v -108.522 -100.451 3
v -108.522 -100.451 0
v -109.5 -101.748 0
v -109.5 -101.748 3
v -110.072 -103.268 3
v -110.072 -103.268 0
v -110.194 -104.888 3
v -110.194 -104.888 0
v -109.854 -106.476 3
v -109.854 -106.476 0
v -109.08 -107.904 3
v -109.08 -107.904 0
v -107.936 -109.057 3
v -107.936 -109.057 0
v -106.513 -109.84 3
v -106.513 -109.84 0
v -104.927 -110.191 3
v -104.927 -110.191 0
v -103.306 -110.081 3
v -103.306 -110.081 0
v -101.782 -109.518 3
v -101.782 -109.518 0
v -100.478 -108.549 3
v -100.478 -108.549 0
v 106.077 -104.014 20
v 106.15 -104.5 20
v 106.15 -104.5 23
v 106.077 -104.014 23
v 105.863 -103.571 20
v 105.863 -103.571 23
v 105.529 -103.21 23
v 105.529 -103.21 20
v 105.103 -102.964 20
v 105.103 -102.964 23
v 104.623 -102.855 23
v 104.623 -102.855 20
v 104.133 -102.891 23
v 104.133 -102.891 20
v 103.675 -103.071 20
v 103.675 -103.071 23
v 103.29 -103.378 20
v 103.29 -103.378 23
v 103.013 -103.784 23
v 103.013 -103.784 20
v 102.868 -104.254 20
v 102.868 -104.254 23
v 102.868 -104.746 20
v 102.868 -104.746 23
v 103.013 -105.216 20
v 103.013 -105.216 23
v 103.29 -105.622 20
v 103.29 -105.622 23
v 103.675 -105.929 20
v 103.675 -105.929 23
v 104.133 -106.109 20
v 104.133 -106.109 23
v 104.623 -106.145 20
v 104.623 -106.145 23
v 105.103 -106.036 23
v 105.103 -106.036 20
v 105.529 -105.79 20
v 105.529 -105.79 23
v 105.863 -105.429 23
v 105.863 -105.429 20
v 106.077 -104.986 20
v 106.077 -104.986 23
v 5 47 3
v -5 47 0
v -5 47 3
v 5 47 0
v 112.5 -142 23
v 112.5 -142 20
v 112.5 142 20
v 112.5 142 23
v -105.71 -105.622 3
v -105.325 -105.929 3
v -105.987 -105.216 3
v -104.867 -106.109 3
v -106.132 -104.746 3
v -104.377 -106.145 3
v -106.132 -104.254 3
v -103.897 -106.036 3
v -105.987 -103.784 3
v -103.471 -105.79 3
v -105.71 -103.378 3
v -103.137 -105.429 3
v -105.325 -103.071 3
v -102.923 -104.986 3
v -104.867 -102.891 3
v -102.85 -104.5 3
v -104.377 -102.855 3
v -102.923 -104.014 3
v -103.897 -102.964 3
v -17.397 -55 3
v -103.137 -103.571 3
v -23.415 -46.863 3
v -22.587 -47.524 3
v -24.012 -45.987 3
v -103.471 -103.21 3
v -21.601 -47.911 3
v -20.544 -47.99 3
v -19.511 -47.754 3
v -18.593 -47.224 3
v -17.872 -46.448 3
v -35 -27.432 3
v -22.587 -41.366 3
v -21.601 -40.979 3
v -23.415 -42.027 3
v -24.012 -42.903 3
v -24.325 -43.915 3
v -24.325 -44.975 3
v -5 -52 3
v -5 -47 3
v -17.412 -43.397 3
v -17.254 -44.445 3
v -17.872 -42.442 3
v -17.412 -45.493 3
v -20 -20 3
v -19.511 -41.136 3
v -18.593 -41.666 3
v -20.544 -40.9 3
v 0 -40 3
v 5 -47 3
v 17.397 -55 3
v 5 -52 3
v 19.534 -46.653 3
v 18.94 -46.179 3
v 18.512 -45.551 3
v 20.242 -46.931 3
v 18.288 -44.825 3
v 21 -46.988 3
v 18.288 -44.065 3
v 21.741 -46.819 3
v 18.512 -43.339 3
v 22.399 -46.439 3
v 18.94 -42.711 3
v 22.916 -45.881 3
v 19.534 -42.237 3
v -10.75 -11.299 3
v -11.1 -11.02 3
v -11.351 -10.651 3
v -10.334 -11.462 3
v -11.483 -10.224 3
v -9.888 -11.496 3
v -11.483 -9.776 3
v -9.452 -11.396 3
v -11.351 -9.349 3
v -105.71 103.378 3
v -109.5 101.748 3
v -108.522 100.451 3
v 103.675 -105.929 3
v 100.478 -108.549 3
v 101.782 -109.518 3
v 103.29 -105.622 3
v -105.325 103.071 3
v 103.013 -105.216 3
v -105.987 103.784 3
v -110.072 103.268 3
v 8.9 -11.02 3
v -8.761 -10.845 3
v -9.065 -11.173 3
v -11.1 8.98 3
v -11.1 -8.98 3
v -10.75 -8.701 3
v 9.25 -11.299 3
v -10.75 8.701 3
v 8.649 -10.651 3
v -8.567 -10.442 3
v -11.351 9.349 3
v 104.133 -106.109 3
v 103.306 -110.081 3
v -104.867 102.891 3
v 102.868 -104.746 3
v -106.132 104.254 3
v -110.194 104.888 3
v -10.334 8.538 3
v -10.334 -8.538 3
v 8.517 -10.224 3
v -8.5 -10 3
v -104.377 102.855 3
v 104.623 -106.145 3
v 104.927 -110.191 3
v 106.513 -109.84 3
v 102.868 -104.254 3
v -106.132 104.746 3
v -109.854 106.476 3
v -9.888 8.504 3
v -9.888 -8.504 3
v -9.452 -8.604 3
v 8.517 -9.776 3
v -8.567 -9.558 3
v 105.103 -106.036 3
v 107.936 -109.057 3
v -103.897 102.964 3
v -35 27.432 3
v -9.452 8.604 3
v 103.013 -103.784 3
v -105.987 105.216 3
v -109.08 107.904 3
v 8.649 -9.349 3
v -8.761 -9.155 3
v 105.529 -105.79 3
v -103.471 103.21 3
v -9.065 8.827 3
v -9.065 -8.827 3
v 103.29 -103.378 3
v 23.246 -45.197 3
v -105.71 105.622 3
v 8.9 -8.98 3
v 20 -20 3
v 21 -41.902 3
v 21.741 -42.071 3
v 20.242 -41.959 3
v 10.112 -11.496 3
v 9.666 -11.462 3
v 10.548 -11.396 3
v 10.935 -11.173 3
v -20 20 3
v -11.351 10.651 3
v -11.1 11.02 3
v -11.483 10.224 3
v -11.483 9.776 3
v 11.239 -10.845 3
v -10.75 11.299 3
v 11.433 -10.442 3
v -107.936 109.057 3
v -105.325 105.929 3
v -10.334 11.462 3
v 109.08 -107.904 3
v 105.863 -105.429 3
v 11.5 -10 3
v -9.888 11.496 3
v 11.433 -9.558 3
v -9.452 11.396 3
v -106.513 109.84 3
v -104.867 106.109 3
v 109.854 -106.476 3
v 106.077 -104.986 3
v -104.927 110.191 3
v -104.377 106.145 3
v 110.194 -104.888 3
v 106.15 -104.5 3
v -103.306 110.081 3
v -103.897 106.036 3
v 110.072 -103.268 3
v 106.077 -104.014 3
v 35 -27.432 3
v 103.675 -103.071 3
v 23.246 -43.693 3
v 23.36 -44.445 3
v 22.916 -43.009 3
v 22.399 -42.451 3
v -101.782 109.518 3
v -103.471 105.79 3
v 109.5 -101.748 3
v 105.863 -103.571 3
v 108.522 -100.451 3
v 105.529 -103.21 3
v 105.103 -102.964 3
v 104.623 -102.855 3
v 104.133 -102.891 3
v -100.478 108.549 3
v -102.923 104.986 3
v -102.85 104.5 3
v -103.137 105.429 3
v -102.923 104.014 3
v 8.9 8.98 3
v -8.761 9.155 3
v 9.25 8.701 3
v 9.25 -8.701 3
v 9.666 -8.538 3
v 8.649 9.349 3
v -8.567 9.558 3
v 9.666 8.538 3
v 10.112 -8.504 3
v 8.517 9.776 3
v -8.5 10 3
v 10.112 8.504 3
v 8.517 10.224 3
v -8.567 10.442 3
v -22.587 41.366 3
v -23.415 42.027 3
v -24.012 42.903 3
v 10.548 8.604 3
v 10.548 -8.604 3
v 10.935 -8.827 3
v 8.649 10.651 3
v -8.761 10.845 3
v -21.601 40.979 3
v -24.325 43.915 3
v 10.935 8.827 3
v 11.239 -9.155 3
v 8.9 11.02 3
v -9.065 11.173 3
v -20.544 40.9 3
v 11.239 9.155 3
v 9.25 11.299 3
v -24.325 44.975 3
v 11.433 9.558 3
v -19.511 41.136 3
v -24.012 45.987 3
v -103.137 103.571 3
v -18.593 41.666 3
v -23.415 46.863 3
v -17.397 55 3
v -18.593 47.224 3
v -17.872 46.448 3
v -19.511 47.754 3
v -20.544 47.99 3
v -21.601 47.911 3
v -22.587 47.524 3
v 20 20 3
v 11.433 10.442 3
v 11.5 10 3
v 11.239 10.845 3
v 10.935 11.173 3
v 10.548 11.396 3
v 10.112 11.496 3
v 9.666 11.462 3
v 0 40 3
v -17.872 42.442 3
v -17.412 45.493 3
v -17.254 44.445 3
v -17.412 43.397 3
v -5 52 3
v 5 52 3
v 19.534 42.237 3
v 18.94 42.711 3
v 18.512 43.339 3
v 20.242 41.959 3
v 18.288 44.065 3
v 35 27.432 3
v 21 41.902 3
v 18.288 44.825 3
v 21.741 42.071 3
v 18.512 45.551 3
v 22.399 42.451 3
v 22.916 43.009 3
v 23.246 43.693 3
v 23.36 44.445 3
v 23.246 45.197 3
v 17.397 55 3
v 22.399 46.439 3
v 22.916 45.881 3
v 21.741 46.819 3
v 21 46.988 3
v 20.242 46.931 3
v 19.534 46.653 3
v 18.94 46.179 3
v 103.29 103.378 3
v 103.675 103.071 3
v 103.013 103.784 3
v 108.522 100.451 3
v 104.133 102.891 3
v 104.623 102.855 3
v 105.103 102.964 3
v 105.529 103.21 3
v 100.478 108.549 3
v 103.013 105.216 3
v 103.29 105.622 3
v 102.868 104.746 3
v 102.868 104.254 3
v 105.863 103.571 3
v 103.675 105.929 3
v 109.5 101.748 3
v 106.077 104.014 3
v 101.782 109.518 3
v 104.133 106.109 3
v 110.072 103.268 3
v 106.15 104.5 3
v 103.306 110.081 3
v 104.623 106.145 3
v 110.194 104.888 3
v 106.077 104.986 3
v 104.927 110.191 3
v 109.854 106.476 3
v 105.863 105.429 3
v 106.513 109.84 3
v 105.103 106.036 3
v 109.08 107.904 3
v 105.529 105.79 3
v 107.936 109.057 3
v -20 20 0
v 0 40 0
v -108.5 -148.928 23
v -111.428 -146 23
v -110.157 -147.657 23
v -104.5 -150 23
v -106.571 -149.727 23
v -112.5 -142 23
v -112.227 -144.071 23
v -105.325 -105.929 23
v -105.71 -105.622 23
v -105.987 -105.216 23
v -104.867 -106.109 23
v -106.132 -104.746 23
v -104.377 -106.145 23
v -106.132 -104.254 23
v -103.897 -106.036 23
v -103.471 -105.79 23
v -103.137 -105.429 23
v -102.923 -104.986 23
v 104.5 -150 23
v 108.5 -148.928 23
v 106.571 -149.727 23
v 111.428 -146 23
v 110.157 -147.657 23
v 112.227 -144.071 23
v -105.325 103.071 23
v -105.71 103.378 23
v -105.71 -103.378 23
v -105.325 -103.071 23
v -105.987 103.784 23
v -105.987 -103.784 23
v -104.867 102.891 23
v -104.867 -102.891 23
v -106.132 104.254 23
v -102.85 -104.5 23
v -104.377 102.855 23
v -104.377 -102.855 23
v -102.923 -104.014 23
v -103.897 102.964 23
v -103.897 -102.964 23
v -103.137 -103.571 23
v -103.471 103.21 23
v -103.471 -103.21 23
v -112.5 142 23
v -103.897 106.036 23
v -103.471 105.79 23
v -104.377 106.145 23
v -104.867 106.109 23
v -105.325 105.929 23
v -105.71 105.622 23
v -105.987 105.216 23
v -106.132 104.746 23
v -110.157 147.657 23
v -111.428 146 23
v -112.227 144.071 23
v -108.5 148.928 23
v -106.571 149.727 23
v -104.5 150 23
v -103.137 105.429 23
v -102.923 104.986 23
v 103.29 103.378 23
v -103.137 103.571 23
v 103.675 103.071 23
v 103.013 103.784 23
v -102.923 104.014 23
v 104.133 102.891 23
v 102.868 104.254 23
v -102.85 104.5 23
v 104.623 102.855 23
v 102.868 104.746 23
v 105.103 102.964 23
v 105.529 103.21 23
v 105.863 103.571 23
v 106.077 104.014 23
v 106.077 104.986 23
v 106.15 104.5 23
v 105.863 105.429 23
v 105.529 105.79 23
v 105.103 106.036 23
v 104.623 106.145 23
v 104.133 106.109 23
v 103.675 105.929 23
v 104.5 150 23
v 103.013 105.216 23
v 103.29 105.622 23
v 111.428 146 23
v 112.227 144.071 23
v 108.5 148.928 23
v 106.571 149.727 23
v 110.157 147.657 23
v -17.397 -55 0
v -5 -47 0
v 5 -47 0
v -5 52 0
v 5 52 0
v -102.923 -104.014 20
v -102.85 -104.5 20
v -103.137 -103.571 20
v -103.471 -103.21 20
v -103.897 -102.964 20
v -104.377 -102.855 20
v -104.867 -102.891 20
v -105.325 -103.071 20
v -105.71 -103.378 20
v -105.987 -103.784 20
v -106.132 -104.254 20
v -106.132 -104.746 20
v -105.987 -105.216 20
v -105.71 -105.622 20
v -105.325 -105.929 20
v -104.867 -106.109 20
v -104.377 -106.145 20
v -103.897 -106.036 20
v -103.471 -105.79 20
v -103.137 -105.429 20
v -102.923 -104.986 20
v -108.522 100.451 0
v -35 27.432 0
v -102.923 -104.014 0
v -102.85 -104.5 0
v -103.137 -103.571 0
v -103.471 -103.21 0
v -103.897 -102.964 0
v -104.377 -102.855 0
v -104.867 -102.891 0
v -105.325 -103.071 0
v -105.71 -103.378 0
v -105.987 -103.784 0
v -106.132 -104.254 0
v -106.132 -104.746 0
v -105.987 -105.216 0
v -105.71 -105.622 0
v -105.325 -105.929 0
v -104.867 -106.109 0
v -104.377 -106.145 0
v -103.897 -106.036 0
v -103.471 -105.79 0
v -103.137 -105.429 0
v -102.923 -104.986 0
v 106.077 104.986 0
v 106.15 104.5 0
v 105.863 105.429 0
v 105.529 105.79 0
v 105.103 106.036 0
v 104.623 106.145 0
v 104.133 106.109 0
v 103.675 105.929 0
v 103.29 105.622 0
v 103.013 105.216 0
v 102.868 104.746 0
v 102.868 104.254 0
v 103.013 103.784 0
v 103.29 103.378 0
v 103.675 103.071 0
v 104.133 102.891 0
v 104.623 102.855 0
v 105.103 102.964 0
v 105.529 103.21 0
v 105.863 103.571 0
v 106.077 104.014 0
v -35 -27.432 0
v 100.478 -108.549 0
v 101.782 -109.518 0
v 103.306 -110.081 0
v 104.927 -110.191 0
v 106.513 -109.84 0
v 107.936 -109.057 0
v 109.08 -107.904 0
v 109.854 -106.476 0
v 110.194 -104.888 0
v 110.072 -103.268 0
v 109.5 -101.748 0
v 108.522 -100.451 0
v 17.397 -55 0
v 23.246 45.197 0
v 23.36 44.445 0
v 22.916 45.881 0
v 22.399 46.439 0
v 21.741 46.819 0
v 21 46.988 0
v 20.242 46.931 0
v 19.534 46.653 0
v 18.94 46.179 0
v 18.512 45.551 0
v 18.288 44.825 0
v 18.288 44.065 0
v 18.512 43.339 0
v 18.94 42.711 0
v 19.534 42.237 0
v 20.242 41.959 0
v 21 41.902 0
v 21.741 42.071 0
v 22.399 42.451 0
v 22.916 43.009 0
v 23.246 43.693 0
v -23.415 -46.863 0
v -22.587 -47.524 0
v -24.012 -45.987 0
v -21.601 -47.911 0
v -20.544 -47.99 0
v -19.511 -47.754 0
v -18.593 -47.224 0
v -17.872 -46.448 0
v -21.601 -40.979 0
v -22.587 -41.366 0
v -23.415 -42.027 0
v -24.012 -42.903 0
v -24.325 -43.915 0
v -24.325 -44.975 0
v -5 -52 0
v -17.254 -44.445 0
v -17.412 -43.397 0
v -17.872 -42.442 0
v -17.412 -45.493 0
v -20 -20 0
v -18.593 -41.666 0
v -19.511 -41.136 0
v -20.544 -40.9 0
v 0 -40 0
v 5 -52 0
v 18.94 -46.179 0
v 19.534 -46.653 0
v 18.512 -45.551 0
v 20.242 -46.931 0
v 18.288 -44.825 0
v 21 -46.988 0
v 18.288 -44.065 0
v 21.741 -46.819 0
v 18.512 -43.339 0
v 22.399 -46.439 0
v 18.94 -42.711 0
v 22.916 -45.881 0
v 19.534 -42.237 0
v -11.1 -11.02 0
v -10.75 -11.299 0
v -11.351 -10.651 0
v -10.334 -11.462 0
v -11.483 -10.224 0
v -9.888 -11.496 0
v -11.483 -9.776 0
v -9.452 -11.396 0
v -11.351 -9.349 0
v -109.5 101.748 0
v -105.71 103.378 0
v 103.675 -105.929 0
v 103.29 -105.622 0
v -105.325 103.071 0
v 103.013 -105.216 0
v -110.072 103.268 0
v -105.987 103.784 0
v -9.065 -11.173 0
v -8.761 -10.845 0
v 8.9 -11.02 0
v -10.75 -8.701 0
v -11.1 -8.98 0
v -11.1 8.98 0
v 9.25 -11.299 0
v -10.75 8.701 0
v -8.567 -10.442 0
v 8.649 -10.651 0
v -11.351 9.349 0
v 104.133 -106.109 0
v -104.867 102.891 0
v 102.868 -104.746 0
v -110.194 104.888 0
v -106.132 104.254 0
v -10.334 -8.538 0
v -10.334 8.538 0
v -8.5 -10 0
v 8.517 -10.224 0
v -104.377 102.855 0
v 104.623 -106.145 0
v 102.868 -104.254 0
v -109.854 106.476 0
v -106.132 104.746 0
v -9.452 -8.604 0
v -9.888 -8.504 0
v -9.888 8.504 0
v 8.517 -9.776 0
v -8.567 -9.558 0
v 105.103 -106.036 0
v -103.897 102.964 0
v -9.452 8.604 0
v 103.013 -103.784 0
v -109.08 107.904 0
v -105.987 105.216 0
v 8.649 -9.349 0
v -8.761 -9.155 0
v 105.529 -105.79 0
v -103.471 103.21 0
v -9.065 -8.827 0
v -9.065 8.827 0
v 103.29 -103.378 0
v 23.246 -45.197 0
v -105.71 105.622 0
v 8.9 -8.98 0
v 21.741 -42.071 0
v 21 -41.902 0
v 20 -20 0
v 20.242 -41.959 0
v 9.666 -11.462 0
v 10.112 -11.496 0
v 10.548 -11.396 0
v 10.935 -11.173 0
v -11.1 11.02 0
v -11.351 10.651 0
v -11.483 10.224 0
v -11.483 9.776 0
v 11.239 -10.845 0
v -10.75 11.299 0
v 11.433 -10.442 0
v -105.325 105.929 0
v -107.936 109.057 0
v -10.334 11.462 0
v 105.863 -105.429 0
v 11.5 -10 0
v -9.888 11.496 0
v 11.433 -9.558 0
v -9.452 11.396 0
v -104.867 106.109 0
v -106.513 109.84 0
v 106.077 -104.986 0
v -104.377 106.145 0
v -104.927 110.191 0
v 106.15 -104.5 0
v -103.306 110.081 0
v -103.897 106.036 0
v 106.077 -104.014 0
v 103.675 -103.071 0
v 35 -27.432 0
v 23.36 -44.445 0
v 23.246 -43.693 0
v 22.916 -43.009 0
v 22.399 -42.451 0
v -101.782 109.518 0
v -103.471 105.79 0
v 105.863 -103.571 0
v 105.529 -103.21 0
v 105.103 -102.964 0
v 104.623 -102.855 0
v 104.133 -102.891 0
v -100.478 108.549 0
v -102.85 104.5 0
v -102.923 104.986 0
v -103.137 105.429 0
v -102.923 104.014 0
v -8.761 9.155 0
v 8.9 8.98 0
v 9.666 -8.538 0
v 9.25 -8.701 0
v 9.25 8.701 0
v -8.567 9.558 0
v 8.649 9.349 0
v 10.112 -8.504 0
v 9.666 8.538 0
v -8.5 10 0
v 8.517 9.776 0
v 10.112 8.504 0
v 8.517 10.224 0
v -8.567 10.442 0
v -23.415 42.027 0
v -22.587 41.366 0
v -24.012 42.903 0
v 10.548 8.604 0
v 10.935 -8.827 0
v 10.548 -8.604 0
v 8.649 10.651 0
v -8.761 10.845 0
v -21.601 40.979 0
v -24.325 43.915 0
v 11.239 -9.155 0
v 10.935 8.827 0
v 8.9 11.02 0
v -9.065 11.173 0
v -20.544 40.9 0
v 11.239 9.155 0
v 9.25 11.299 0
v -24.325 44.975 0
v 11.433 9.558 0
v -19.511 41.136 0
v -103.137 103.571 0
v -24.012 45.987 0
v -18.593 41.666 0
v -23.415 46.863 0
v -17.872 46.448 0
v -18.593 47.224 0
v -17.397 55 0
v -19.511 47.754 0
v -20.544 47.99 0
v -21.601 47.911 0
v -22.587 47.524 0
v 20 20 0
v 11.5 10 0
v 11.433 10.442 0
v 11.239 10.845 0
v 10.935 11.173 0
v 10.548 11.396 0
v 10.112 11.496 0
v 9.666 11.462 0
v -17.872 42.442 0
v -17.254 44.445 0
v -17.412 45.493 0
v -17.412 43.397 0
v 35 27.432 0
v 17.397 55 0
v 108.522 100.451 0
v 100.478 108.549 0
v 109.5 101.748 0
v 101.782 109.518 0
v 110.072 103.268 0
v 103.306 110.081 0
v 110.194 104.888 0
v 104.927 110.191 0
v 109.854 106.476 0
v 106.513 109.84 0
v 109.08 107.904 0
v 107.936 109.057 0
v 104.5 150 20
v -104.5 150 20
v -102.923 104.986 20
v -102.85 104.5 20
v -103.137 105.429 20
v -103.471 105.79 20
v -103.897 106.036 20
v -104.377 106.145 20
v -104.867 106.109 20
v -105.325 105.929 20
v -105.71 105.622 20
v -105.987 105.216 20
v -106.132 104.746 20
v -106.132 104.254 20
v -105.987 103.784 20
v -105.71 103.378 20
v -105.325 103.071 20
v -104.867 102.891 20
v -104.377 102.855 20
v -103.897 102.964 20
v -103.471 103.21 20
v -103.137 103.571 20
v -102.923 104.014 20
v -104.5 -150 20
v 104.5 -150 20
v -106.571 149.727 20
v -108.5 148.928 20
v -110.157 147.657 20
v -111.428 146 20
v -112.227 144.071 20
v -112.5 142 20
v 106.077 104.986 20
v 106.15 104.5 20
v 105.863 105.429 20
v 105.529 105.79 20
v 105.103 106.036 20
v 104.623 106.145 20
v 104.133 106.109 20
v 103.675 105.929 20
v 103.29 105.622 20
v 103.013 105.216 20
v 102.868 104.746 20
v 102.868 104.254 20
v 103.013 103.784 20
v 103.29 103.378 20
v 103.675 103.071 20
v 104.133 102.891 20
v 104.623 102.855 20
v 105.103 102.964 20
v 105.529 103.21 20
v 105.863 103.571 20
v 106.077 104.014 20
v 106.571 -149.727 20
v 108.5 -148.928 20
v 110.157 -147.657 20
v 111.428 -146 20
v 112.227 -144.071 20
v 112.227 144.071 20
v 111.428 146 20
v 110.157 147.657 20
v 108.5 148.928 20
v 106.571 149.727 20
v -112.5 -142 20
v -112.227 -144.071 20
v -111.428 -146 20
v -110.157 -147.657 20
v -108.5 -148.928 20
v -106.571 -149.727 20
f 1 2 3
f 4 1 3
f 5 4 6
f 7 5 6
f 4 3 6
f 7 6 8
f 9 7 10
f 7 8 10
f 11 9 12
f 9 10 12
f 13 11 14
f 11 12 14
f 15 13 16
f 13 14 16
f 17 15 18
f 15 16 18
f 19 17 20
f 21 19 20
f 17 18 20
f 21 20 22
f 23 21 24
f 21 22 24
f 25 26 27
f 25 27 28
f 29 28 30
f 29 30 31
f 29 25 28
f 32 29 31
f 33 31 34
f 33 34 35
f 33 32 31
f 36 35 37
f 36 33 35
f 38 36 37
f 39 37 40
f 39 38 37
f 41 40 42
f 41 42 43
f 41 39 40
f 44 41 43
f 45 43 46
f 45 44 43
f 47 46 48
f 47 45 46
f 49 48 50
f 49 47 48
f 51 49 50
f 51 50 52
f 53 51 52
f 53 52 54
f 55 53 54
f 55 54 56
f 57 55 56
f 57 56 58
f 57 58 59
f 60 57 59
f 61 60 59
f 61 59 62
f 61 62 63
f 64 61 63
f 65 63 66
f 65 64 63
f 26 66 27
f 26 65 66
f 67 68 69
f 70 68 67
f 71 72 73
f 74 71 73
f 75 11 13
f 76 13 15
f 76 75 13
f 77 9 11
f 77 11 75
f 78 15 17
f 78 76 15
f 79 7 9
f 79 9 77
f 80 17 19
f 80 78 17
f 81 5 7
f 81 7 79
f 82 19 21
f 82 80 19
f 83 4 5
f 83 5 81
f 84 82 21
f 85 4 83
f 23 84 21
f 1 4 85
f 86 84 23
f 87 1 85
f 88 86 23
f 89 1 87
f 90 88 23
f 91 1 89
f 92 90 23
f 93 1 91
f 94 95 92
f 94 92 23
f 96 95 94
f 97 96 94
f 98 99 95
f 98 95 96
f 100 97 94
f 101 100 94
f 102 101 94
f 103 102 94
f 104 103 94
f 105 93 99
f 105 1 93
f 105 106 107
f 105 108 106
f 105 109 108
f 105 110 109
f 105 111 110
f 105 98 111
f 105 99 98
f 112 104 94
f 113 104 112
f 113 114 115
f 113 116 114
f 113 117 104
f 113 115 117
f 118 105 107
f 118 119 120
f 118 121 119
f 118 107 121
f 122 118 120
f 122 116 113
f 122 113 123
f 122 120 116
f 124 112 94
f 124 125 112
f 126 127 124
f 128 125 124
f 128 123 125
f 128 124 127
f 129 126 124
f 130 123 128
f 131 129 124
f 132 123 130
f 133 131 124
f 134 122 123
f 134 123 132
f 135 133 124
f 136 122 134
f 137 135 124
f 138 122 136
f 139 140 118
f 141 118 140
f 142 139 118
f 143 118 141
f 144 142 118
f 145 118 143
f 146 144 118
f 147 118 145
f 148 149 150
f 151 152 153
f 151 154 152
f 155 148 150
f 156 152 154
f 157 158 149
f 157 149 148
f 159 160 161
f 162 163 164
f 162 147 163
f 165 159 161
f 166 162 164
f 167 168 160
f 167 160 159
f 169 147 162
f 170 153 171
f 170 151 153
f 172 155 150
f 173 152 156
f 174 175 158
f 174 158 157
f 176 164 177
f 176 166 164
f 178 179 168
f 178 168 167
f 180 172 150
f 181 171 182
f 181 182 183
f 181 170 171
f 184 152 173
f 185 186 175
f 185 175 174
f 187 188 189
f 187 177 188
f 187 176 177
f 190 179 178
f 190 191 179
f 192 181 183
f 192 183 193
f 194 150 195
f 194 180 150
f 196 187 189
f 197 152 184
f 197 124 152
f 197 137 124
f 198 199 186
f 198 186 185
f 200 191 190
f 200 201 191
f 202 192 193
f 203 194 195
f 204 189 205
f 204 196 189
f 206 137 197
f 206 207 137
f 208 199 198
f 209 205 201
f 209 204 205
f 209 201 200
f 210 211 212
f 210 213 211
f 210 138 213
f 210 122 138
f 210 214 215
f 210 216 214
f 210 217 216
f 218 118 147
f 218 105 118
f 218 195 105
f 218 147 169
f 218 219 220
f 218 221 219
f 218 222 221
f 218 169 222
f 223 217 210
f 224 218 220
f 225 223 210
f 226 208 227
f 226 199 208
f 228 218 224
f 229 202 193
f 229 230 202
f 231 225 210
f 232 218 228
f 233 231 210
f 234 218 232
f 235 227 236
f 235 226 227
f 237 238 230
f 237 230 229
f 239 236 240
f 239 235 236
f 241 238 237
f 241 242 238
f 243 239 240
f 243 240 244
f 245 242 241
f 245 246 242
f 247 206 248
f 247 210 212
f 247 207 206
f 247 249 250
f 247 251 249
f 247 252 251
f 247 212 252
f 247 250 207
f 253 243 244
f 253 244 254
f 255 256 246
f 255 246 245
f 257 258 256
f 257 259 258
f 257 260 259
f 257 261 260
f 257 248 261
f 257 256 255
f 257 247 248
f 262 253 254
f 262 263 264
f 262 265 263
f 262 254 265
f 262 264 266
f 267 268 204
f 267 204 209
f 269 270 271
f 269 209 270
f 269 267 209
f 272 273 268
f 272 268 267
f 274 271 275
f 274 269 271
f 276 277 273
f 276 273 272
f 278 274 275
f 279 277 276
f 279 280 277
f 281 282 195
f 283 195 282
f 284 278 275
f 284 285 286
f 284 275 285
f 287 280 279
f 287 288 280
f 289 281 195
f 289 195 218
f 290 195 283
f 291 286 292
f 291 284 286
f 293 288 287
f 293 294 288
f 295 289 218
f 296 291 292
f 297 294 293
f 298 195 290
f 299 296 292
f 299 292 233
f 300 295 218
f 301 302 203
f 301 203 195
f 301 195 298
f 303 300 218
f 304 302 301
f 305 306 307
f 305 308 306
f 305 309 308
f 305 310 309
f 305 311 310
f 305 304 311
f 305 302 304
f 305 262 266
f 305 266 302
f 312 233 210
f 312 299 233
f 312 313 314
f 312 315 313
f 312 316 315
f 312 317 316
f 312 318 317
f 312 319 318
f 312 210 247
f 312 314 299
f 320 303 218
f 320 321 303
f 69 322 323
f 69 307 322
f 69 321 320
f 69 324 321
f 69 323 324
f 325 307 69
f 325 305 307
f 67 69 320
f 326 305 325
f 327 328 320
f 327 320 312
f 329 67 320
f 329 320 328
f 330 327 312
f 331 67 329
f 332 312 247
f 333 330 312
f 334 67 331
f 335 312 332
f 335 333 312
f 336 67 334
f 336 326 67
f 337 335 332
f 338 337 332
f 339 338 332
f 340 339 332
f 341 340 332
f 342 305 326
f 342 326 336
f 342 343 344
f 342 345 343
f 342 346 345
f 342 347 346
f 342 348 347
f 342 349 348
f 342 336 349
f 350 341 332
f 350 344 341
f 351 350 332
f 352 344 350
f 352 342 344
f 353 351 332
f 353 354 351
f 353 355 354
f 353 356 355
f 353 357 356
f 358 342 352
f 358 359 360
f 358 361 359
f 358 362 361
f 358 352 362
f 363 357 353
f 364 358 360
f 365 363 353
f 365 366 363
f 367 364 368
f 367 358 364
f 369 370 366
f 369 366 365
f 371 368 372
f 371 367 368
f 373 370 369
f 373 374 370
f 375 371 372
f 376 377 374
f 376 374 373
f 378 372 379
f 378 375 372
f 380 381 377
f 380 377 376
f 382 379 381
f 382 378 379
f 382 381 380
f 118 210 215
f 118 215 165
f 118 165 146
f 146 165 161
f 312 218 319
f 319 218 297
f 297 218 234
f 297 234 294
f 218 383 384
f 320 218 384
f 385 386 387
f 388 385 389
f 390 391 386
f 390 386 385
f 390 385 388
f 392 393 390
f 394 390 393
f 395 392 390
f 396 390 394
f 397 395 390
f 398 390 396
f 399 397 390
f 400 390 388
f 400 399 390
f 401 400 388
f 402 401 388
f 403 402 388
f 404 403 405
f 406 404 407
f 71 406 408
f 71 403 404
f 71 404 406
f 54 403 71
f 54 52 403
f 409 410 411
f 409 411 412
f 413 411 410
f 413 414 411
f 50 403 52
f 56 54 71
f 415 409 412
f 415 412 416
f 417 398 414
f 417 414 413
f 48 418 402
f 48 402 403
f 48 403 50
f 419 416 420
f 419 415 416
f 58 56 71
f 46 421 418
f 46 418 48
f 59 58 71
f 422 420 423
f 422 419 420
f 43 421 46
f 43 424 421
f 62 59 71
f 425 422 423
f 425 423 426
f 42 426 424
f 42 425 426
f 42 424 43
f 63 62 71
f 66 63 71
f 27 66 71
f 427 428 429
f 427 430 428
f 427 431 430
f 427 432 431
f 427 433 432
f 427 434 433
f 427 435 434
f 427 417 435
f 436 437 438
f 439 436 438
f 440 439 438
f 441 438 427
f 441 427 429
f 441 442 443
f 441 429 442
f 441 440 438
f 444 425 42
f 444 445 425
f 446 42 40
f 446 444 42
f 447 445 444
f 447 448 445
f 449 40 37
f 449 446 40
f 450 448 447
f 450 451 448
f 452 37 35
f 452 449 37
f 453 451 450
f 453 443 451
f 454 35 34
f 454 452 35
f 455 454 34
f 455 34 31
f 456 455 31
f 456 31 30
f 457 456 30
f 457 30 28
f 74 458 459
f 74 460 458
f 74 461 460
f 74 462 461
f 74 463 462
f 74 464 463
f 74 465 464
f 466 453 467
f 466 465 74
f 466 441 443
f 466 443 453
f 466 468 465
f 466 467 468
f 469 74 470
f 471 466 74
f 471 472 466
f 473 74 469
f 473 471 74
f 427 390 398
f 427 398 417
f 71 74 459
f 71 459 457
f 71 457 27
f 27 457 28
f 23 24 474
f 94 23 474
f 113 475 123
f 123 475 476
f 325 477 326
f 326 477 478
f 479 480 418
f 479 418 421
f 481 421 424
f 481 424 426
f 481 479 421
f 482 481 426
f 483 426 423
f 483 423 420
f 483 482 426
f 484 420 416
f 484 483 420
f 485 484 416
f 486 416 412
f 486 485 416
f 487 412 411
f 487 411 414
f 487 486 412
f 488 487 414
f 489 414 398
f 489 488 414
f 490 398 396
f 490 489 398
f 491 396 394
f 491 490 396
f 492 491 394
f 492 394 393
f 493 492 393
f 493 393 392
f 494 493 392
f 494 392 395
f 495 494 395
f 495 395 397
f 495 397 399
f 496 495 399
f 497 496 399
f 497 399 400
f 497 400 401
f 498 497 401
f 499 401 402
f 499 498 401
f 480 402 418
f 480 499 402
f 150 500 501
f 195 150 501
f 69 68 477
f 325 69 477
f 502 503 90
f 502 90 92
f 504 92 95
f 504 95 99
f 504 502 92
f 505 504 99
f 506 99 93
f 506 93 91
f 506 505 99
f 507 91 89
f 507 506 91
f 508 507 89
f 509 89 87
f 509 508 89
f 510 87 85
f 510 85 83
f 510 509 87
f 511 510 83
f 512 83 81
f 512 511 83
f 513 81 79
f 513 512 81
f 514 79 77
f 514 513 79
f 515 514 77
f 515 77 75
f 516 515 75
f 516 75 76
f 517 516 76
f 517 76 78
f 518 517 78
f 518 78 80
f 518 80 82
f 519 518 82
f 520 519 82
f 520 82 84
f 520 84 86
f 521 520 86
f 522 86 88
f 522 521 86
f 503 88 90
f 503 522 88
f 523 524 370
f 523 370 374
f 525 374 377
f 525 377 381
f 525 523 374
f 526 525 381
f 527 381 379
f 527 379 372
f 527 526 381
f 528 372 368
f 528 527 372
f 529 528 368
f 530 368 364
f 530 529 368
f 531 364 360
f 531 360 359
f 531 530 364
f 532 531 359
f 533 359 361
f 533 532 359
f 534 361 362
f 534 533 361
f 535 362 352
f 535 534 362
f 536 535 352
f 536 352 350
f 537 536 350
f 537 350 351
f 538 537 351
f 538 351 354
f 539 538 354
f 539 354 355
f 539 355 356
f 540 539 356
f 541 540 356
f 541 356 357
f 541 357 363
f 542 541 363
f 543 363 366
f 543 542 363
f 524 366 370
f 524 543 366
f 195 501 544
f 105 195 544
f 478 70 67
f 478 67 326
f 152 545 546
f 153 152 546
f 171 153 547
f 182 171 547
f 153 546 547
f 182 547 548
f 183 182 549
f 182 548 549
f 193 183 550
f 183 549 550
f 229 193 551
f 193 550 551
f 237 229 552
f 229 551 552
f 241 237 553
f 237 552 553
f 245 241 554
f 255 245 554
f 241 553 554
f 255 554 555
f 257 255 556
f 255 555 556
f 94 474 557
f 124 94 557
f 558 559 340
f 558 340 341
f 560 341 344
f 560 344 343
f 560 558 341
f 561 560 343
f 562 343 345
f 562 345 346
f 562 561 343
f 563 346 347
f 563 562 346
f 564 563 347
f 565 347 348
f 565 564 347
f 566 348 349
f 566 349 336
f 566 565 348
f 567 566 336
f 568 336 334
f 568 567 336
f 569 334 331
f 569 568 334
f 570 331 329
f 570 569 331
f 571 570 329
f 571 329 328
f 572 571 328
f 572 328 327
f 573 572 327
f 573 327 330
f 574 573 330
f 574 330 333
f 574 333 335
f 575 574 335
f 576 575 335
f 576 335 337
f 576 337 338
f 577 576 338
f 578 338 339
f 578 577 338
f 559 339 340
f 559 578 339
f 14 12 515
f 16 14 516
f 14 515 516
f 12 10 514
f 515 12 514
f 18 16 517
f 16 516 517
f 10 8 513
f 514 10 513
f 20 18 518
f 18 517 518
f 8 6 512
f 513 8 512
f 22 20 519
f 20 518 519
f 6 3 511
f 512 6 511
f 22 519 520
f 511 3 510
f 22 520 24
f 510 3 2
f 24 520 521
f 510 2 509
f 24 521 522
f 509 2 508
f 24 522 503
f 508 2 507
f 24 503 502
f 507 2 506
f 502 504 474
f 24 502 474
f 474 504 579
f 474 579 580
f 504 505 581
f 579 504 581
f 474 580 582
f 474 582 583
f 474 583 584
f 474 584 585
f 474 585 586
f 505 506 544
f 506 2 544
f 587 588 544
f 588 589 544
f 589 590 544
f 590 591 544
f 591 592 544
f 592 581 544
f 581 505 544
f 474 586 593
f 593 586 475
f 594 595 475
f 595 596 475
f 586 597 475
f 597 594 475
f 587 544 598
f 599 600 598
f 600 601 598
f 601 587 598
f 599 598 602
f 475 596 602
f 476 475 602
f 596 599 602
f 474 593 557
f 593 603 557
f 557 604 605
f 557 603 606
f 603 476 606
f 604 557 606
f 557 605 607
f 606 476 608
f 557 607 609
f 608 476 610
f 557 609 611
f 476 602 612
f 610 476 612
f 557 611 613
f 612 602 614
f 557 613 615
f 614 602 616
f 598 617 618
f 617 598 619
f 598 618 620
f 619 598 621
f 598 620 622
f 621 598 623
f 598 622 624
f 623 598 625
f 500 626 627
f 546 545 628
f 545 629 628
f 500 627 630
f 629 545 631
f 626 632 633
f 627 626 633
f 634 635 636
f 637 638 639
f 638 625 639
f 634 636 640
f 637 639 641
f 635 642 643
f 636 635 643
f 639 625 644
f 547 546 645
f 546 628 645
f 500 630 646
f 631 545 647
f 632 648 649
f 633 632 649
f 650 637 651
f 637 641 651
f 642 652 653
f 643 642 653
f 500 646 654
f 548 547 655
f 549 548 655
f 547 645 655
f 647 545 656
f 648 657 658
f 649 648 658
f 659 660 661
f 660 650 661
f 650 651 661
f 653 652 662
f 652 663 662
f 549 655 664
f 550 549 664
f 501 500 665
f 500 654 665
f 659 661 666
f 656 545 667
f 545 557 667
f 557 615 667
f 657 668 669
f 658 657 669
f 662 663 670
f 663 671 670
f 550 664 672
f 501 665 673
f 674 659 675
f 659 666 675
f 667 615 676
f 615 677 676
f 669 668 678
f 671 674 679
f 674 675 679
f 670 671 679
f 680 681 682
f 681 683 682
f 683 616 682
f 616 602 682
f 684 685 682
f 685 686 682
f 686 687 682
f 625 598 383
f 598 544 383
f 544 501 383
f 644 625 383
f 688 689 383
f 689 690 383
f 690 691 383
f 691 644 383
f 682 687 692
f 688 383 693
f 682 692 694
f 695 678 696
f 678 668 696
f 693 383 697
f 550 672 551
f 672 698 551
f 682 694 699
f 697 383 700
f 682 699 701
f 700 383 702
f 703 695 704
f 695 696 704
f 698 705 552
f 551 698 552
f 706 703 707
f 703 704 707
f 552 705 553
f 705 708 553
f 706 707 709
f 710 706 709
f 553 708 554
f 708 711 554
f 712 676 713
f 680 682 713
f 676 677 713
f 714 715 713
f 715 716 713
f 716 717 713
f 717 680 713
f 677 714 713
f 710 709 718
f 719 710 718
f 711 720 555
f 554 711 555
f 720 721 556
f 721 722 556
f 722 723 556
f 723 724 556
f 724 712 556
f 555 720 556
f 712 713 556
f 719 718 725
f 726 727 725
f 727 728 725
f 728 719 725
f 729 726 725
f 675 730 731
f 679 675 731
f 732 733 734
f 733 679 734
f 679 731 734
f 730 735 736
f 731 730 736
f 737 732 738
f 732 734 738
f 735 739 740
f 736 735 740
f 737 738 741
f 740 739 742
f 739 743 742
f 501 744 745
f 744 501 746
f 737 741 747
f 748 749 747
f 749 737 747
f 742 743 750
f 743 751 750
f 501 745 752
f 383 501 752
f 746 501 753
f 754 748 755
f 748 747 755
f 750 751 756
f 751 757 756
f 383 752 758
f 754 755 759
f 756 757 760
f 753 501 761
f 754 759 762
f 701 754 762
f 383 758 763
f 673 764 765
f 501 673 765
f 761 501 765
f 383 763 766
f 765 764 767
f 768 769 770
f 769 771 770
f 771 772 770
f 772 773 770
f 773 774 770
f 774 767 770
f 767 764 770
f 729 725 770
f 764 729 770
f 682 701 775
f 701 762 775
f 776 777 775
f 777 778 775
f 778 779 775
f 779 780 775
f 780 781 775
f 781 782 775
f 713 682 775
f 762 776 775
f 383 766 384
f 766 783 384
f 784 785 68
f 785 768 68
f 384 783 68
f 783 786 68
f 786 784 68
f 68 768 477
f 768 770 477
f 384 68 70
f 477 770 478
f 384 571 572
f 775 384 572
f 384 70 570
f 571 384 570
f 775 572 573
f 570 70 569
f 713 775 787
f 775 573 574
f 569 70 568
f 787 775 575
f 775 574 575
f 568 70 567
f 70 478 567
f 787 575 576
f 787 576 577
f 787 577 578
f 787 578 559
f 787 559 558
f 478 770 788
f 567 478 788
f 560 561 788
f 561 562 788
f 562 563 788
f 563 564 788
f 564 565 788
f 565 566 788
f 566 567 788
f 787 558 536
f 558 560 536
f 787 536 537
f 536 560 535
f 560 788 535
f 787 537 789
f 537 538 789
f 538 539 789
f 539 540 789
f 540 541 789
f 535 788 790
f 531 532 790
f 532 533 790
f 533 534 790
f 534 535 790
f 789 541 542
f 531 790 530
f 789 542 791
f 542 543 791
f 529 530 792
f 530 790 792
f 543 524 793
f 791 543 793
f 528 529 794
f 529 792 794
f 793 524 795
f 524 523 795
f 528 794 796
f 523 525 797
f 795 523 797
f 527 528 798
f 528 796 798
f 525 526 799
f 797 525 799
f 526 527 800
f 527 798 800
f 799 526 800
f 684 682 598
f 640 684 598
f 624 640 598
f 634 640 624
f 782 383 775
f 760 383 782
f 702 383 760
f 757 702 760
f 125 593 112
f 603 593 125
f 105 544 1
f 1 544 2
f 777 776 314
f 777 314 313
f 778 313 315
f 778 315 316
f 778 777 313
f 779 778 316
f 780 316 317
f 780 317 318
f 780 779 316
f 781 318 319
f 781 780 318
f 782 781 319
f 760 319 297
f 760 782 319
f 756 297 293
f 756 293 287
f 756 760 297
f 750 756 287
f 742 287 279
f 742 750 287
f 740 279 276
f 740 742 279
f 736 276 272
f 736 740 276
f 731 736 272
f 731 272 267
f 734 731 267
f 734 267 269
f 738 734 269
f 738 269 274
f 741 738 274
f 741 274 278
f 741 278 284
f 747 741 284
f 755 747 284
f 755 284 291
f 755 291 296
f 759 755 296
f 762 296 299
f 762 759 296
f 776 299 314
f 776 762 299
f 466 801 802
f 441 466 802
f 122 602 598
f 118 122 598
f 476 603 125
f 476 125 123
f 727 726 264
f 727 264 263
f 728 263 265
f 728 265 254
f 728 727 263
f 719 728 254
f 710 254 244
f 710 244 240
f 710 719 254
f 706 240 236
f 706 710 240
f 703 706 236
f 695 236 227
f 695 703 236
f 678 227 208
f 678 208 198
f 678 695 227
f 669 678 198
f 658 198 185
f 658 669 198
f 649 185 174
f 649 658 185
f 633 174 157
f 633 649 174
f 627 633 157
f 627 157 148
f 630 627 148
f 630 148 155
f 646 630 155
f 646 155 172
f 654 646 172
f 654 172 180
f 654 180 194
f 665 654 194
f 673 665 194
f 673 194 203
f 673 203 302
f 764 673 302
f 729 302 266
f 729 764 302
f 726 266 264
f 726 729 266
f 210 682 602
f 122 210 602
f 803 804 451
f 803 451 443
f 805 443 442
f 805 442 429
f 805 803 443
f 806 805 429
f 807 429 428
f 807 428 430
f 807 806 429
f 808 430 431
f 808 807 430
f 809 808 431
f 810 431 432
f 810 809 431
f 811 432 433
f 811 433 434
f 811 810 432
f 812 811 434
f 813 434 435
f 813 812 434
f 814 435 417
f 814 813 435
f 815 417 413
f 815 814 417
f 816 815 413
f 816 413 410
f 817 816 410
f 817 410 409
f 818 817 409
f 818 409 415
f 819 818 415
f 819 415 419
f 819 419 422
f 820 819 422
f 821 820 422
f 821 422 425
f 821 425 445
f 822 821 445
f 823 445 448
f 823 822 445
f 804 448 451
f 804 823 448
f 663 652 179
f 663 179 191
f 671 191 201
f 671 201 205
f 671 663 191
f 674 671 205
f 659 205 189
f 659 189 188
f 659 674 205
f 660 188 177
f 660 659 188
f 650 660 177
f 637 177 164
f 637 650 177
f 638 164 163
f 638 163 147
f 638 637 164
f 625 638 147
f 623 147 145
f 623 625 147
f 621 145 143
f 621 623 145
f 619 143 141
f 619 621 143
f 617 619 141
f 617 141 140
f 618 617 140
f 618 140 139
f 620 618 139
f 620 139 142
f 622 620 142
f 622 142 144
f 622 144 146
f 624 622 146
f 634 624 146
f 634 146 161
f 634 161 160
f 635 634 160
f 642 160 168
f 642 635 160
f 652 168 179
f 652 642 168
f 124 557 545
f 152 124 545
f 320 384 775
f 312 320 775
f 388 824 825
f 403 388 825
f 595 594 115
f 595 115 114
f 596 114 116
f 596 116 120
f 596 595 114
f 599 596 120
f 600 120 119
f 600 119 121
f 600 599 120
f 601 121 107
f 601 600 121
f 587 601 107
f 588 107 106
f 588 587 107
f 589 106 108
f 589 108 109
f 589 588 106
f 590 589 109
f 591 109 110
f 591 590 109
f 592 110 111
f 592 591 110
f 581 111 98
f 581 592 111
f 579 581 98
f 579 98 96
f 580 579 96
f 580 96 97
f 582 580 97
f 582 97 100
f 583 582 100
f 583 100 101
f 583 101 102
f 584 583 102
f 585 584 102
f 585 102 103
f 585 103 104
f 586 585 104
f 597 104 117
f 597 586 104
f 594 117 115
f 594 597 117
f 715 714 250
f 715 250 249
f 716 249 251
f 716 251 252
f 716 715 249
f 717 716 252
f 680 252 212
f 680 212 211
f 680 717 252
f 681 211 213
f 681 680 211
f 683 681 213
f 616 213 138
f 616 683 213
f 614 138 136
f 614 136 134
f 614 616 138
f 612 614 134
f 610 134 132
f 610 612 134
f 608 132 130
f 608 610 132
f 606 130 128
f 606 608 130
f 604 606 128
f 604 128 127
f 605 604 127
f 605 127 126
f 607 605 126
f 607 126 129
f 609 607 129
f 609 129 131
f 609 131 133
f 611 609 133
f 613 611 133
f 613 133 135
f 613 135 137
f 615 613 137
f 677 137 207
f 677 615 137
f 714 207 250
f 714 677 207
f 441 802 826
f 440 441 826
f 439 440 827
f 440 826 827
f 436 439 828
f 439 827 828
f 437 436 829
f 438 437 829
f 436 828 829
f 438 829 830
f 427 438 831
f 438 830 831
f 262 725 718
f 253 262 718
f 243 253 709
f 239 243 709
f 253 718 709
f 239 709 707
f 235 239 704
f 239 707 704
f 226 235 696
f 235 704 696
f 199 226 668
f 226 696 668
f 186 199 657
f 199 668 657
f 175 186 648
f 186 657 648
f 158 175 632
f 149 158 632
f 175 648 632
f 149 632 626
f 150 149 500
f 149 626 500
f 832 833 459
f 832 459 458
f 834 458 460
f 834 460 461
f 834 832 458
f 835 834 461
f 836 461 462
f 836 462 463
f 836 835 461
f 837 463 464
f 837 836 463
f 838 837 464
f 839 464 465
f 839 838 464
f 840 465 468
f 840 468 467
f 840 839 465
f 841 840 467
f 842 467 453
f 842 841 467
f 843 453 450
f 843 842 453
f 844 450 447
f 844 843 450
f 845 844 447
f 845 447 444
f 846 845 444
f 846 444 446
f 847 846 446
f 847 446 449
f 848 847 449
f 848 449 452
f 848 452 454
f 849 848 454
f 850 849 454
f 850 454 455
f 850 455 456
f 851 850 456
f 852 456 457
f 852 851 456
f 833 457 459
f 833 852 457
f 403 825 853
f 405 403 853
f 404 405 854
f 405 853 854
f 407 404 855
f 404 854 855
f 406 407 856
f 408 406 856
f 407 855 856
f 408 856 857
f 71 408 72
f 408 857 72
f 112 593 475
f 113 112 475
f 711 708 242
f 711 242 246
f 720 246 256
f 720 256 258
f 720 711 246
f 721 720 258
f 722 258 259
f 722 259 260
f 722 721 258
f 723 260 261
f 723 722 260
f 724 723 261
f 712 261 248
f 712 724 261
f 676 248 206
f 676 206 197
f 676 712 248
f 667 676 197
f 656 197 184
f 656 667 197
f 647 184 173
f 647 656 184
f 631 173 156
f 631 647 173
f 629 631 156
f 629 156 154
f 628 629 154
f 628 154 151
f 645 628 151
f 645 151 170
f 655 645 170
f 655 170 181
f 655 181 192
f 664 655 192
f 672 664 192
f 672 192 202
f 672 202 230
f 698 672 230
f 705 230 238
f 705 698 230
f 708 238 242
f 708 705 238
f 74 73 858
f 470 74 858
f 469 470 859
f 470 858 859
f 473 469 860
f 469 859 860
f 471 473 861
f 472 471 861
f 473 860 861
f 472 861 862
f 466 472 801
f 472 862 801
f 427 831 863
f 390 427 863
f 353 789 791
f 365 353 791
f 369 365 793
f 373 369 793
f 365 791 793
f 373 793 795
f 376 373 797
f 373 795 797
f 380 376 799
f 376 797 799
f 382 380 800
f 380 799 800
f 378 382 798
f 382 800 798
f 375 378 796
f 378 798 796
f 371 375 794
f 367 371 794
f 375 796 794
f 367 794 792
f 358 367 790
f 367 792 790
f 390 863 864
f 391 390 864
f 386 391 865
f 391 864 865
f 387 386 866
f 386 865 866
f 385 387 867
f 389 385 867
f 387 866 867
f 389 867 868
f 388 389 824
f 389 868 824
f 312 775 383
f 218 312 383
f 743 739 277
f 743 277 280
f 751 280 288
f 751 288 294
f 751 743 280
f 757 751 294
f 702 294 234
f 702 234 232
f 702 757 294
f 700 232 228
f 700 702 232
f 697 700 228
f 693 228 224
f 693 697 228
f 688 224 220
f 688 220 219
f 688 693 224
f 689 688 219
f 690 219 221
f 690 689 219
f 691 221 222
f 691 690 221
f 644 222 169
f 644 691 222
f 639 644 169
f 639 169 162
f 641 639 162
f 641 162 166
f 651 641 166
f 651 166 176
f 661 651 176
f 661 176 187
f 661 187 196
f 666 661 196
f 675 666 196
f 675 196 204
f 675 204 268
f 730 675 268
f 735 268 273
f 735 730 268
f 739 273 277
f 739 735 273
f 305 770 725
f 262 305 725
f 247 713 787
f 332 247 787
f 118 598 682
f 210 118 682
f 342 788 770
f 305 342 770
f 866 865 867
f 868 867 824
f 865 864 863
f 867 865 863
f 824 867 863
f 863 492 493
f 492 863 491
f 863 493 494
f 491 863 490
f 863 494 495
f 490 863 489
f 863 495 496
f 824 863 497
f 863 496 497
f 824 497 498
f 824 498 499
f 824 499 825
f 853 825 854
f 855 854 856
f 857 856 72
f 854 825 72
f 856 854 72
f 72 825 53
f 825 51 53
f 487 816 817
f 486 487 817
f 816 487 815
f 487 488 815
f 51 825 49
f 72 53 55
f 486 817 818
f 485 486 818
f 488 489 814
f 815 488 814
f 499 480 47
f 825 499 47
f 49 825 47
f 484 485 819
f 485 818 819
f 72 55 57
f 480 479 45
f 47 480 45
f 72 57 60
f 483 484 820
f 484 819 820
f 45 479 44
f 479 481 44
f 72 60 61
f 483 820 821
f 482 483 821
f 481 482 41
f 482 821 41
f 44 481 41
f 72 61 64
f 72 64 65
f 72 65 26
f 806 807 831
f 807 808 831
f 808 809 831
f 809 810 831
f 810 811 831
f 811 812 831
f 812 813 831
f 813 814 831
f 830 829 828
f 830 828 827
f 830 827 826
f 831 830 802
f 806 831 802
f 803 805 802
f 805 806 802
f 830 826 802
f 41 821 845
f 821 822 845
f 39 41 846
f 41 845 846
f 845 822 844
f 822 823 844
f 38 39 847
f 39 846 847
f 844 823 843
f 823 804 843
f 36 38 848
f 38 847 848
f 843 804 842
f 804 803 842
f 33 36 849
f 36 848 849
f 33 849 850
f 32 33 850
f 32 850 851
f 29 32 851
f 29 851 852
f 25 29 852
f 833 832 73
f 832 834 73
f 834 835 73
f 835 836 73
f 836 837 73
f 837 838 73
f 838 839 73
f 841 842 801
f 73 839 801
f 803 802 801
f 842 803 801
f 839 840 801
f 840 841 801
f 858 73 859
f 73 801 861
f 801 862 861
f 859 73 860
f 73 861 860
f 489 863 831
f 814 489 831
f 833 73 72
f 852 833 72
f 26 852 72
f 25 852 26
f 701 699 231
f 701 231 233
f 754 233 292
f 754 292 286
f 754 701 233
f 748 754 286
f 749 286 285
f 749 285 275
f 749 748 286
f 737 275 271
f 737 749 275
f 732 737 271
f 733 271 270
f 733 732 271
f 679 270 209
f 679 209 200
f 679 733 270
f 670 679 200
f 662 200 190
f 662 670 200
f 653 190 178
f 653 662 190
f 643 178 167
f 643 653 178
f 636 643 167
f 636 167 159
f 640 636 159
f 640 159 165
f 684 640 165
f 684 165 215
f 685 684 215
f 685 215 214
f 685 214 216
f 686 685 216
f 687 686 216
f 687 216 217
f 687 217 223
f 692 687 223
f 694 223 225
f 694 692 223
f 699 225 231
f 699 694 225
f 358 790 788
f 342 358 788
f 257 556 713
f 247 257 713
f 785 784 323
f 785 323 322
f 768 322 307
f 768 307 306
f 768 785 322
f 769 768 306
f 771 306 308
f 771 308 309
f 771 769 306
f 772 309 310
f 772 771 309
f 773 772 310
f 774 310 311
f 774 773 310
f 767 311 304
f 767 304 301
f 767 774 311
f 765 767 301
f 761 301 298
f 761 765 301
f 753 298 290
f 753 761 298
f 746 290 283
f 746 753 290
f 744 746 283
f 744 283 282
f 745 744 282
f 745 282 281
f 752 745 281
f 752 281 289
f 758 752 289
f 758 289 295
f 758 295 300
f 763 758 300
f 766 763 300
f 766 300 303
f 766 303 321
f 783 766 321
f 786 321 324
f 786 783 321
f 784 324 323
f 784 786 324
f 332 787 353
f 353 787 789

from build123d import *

# Parameters (mm, degrees)
F0_R     = 1.65
F0_R_2   = 3.555
F0_R_3   = 1.5
F0_W     = 10
F0_H     = 5
F0_R_4   = 2.55
F1_DEPTH = 3
F3_START = 20
F2_R     = 1.65
F3_DEPTH = 3


# Not quite as in the source:
# - a feature names something its author has since deleted; it is built from what else it names


with BuildPart() as f1:
    # F0 (on Top) → F1 (new body)
    with BuildSketch(Plane.XY):
        with BuildLine():
            Line((-17.3973424224, 55), (-100.4784052001, 108.5492745357))
            ThreePointArc((-100.4784052001, 108.5492745357), (-108.5492745357, 108.5215947999), (-108.5215947999, 100.4507254643))
            Line((-108.5215947999, 100.4507254643), (-35, 27.4317042255))
            Line((-35, 27.4317042255), (-35, -27.4317042255))
            Line((-35, -27.4317042255), (-108.5215947999, -100.4507254643))
            ThreePointArc((-108.5215947999, -100.4507254643), (-108.5492745357, -108.5215947999), (-100.4784052001, -108.5492745357))
            Line((-100.4784052001, -108.5492745357), (-17.3973424224, -55))
            Line((-17.3973424224, -55), (17.3973424224, -55))
            Line((17.3973424224, -55), (100.4784052001, -108.5492745357))
            ThreePointArc((100.4784052001, -108.5492745357), (108.5492745357, -108.5215947999), (108.5215947999, -100.4507254643))
            Line((108.5215947999, -100.4507254643), (35, -27.4317042255))
            Line((35, -27.4317042255), (35, 27.4317042255))
            Line((35, 27.4317042255), (108.5215947999, 100.4507254643))
            ThreePointArc((108.5215947999, 100.4507254643), (108.5492745357, 108.5215947999), (100.4784052001, 108.5492745357))
            Line((100.4784052001, 108.5492745357), (17.3973424224, 55))
            Line((17.3973424224, 55), (-17.3973424224, 55))
        make_face()
        with Locations((-104.5, -104.5)):
            Circle(F0_R, mode=Mode.SUBTRACT)
        with Locations((-20.8095, -44.445)):
            Circle(F0_R_2, mode=Mode.SUBTRACT)
        with Locations((-10, -10)):
            Circle(F0_R_3, mode=Mode.SUBTRACT)
        with Locations((104.5, -104.5)):
            Circle(F0_R, mode=Mode.SUBTRACT)
        with Locations((0, -49.5)):
            Rectangle(F0_W, F0_H, mode=Mode.SUBTRACT)
        with Locations((20.8095, -44.445)):
            Circle(F0_R_4, mode=Mode.SUBTRACT)
        Polygon((0, -40), (-20, -20), (20, -20), align=None, mode=Mode.SUBTRACT)
        with Locations((10, -10)):
            Circle(F0_R_3, mode=Mode.SUBTRACT)
        with Locations((-10, 10)):
            Circle(F0_R_3, mode=Mode.SUBTRACT)
        with Locations((-20.8095, 44.445)):
            Circle(F0_R_2, mode=Mode.SUBTRACT)
        with Locations((-104.5, 104.5)):
            Circle(F0_R, mode=Mode.SUBTRACT)
        with Locations((10, 10)):
            Circle(F0_R_3, mode=Mode.SUBTRACT)
        Polygon((-20, 20), (0, 40), (20, 20), align=None, mode=Mode.SUBTRACT)
        with Locations((0, 49.5)):
            Rectangle(F0_W, F0_H, mode=Mode.SUBTRACT)
        with Locations((20.8095, 44.445)):
            Circle(F0_R_4, mode=Mode.SUBTRACT)
        with Locations((104.5, 104.5)):
            Circle(F0_R, mode=Mode.SUBTRACT)
    extrude(amount=F1_DEPTH)


with BuildPart() as f3:
    # F2 (on Top) → F3 (new body)
    with BuildSketch(Plane.XY.offset(F3_START)):
        with BuildLine():
            Line((104.5, 150), (-104.5, 150))
            ThreePointArc((-104.5, 150), (-110.1568542495, 147.6568542495), (-112.5, 142))
            Line((-112.5, 142), (-112.5, -142))
            ThreePointArc((-112.5, -142), (-110.1568542495, -147.6568542495), (-104.5, -150))
            Line((-104.5, -150), (104.5, -150))
            ThreePointArc((104.5, -150), (110.1568542495, -147.6568542495), (112.5, -142))
            Line((112.5, -142), (112.5, 142))
            ThreePointArc((112.5, 142), (110.1568542495, 147.6568542495), (104.5, 150))
        make_face()
        with Locations((-104.5, -104.5)):
            Circle(F2_R, mode=Mode.SUBTRACT)
        with Locations((104.5, -104.5)):
            Circle(F2_R, mode=Mode.SUBTRACT)
        with Locations((-104.5, 104.5)):
            Circle(F2_R, mode=Mode.SUBTRACT)
        with Locations((104.5, 104.5)):
            Circle(F2_R, mode=Mode.SUBTRACT)
    extrude(amount=F3_DEPTH)


solid = Compound([f1.part, f3.part])
